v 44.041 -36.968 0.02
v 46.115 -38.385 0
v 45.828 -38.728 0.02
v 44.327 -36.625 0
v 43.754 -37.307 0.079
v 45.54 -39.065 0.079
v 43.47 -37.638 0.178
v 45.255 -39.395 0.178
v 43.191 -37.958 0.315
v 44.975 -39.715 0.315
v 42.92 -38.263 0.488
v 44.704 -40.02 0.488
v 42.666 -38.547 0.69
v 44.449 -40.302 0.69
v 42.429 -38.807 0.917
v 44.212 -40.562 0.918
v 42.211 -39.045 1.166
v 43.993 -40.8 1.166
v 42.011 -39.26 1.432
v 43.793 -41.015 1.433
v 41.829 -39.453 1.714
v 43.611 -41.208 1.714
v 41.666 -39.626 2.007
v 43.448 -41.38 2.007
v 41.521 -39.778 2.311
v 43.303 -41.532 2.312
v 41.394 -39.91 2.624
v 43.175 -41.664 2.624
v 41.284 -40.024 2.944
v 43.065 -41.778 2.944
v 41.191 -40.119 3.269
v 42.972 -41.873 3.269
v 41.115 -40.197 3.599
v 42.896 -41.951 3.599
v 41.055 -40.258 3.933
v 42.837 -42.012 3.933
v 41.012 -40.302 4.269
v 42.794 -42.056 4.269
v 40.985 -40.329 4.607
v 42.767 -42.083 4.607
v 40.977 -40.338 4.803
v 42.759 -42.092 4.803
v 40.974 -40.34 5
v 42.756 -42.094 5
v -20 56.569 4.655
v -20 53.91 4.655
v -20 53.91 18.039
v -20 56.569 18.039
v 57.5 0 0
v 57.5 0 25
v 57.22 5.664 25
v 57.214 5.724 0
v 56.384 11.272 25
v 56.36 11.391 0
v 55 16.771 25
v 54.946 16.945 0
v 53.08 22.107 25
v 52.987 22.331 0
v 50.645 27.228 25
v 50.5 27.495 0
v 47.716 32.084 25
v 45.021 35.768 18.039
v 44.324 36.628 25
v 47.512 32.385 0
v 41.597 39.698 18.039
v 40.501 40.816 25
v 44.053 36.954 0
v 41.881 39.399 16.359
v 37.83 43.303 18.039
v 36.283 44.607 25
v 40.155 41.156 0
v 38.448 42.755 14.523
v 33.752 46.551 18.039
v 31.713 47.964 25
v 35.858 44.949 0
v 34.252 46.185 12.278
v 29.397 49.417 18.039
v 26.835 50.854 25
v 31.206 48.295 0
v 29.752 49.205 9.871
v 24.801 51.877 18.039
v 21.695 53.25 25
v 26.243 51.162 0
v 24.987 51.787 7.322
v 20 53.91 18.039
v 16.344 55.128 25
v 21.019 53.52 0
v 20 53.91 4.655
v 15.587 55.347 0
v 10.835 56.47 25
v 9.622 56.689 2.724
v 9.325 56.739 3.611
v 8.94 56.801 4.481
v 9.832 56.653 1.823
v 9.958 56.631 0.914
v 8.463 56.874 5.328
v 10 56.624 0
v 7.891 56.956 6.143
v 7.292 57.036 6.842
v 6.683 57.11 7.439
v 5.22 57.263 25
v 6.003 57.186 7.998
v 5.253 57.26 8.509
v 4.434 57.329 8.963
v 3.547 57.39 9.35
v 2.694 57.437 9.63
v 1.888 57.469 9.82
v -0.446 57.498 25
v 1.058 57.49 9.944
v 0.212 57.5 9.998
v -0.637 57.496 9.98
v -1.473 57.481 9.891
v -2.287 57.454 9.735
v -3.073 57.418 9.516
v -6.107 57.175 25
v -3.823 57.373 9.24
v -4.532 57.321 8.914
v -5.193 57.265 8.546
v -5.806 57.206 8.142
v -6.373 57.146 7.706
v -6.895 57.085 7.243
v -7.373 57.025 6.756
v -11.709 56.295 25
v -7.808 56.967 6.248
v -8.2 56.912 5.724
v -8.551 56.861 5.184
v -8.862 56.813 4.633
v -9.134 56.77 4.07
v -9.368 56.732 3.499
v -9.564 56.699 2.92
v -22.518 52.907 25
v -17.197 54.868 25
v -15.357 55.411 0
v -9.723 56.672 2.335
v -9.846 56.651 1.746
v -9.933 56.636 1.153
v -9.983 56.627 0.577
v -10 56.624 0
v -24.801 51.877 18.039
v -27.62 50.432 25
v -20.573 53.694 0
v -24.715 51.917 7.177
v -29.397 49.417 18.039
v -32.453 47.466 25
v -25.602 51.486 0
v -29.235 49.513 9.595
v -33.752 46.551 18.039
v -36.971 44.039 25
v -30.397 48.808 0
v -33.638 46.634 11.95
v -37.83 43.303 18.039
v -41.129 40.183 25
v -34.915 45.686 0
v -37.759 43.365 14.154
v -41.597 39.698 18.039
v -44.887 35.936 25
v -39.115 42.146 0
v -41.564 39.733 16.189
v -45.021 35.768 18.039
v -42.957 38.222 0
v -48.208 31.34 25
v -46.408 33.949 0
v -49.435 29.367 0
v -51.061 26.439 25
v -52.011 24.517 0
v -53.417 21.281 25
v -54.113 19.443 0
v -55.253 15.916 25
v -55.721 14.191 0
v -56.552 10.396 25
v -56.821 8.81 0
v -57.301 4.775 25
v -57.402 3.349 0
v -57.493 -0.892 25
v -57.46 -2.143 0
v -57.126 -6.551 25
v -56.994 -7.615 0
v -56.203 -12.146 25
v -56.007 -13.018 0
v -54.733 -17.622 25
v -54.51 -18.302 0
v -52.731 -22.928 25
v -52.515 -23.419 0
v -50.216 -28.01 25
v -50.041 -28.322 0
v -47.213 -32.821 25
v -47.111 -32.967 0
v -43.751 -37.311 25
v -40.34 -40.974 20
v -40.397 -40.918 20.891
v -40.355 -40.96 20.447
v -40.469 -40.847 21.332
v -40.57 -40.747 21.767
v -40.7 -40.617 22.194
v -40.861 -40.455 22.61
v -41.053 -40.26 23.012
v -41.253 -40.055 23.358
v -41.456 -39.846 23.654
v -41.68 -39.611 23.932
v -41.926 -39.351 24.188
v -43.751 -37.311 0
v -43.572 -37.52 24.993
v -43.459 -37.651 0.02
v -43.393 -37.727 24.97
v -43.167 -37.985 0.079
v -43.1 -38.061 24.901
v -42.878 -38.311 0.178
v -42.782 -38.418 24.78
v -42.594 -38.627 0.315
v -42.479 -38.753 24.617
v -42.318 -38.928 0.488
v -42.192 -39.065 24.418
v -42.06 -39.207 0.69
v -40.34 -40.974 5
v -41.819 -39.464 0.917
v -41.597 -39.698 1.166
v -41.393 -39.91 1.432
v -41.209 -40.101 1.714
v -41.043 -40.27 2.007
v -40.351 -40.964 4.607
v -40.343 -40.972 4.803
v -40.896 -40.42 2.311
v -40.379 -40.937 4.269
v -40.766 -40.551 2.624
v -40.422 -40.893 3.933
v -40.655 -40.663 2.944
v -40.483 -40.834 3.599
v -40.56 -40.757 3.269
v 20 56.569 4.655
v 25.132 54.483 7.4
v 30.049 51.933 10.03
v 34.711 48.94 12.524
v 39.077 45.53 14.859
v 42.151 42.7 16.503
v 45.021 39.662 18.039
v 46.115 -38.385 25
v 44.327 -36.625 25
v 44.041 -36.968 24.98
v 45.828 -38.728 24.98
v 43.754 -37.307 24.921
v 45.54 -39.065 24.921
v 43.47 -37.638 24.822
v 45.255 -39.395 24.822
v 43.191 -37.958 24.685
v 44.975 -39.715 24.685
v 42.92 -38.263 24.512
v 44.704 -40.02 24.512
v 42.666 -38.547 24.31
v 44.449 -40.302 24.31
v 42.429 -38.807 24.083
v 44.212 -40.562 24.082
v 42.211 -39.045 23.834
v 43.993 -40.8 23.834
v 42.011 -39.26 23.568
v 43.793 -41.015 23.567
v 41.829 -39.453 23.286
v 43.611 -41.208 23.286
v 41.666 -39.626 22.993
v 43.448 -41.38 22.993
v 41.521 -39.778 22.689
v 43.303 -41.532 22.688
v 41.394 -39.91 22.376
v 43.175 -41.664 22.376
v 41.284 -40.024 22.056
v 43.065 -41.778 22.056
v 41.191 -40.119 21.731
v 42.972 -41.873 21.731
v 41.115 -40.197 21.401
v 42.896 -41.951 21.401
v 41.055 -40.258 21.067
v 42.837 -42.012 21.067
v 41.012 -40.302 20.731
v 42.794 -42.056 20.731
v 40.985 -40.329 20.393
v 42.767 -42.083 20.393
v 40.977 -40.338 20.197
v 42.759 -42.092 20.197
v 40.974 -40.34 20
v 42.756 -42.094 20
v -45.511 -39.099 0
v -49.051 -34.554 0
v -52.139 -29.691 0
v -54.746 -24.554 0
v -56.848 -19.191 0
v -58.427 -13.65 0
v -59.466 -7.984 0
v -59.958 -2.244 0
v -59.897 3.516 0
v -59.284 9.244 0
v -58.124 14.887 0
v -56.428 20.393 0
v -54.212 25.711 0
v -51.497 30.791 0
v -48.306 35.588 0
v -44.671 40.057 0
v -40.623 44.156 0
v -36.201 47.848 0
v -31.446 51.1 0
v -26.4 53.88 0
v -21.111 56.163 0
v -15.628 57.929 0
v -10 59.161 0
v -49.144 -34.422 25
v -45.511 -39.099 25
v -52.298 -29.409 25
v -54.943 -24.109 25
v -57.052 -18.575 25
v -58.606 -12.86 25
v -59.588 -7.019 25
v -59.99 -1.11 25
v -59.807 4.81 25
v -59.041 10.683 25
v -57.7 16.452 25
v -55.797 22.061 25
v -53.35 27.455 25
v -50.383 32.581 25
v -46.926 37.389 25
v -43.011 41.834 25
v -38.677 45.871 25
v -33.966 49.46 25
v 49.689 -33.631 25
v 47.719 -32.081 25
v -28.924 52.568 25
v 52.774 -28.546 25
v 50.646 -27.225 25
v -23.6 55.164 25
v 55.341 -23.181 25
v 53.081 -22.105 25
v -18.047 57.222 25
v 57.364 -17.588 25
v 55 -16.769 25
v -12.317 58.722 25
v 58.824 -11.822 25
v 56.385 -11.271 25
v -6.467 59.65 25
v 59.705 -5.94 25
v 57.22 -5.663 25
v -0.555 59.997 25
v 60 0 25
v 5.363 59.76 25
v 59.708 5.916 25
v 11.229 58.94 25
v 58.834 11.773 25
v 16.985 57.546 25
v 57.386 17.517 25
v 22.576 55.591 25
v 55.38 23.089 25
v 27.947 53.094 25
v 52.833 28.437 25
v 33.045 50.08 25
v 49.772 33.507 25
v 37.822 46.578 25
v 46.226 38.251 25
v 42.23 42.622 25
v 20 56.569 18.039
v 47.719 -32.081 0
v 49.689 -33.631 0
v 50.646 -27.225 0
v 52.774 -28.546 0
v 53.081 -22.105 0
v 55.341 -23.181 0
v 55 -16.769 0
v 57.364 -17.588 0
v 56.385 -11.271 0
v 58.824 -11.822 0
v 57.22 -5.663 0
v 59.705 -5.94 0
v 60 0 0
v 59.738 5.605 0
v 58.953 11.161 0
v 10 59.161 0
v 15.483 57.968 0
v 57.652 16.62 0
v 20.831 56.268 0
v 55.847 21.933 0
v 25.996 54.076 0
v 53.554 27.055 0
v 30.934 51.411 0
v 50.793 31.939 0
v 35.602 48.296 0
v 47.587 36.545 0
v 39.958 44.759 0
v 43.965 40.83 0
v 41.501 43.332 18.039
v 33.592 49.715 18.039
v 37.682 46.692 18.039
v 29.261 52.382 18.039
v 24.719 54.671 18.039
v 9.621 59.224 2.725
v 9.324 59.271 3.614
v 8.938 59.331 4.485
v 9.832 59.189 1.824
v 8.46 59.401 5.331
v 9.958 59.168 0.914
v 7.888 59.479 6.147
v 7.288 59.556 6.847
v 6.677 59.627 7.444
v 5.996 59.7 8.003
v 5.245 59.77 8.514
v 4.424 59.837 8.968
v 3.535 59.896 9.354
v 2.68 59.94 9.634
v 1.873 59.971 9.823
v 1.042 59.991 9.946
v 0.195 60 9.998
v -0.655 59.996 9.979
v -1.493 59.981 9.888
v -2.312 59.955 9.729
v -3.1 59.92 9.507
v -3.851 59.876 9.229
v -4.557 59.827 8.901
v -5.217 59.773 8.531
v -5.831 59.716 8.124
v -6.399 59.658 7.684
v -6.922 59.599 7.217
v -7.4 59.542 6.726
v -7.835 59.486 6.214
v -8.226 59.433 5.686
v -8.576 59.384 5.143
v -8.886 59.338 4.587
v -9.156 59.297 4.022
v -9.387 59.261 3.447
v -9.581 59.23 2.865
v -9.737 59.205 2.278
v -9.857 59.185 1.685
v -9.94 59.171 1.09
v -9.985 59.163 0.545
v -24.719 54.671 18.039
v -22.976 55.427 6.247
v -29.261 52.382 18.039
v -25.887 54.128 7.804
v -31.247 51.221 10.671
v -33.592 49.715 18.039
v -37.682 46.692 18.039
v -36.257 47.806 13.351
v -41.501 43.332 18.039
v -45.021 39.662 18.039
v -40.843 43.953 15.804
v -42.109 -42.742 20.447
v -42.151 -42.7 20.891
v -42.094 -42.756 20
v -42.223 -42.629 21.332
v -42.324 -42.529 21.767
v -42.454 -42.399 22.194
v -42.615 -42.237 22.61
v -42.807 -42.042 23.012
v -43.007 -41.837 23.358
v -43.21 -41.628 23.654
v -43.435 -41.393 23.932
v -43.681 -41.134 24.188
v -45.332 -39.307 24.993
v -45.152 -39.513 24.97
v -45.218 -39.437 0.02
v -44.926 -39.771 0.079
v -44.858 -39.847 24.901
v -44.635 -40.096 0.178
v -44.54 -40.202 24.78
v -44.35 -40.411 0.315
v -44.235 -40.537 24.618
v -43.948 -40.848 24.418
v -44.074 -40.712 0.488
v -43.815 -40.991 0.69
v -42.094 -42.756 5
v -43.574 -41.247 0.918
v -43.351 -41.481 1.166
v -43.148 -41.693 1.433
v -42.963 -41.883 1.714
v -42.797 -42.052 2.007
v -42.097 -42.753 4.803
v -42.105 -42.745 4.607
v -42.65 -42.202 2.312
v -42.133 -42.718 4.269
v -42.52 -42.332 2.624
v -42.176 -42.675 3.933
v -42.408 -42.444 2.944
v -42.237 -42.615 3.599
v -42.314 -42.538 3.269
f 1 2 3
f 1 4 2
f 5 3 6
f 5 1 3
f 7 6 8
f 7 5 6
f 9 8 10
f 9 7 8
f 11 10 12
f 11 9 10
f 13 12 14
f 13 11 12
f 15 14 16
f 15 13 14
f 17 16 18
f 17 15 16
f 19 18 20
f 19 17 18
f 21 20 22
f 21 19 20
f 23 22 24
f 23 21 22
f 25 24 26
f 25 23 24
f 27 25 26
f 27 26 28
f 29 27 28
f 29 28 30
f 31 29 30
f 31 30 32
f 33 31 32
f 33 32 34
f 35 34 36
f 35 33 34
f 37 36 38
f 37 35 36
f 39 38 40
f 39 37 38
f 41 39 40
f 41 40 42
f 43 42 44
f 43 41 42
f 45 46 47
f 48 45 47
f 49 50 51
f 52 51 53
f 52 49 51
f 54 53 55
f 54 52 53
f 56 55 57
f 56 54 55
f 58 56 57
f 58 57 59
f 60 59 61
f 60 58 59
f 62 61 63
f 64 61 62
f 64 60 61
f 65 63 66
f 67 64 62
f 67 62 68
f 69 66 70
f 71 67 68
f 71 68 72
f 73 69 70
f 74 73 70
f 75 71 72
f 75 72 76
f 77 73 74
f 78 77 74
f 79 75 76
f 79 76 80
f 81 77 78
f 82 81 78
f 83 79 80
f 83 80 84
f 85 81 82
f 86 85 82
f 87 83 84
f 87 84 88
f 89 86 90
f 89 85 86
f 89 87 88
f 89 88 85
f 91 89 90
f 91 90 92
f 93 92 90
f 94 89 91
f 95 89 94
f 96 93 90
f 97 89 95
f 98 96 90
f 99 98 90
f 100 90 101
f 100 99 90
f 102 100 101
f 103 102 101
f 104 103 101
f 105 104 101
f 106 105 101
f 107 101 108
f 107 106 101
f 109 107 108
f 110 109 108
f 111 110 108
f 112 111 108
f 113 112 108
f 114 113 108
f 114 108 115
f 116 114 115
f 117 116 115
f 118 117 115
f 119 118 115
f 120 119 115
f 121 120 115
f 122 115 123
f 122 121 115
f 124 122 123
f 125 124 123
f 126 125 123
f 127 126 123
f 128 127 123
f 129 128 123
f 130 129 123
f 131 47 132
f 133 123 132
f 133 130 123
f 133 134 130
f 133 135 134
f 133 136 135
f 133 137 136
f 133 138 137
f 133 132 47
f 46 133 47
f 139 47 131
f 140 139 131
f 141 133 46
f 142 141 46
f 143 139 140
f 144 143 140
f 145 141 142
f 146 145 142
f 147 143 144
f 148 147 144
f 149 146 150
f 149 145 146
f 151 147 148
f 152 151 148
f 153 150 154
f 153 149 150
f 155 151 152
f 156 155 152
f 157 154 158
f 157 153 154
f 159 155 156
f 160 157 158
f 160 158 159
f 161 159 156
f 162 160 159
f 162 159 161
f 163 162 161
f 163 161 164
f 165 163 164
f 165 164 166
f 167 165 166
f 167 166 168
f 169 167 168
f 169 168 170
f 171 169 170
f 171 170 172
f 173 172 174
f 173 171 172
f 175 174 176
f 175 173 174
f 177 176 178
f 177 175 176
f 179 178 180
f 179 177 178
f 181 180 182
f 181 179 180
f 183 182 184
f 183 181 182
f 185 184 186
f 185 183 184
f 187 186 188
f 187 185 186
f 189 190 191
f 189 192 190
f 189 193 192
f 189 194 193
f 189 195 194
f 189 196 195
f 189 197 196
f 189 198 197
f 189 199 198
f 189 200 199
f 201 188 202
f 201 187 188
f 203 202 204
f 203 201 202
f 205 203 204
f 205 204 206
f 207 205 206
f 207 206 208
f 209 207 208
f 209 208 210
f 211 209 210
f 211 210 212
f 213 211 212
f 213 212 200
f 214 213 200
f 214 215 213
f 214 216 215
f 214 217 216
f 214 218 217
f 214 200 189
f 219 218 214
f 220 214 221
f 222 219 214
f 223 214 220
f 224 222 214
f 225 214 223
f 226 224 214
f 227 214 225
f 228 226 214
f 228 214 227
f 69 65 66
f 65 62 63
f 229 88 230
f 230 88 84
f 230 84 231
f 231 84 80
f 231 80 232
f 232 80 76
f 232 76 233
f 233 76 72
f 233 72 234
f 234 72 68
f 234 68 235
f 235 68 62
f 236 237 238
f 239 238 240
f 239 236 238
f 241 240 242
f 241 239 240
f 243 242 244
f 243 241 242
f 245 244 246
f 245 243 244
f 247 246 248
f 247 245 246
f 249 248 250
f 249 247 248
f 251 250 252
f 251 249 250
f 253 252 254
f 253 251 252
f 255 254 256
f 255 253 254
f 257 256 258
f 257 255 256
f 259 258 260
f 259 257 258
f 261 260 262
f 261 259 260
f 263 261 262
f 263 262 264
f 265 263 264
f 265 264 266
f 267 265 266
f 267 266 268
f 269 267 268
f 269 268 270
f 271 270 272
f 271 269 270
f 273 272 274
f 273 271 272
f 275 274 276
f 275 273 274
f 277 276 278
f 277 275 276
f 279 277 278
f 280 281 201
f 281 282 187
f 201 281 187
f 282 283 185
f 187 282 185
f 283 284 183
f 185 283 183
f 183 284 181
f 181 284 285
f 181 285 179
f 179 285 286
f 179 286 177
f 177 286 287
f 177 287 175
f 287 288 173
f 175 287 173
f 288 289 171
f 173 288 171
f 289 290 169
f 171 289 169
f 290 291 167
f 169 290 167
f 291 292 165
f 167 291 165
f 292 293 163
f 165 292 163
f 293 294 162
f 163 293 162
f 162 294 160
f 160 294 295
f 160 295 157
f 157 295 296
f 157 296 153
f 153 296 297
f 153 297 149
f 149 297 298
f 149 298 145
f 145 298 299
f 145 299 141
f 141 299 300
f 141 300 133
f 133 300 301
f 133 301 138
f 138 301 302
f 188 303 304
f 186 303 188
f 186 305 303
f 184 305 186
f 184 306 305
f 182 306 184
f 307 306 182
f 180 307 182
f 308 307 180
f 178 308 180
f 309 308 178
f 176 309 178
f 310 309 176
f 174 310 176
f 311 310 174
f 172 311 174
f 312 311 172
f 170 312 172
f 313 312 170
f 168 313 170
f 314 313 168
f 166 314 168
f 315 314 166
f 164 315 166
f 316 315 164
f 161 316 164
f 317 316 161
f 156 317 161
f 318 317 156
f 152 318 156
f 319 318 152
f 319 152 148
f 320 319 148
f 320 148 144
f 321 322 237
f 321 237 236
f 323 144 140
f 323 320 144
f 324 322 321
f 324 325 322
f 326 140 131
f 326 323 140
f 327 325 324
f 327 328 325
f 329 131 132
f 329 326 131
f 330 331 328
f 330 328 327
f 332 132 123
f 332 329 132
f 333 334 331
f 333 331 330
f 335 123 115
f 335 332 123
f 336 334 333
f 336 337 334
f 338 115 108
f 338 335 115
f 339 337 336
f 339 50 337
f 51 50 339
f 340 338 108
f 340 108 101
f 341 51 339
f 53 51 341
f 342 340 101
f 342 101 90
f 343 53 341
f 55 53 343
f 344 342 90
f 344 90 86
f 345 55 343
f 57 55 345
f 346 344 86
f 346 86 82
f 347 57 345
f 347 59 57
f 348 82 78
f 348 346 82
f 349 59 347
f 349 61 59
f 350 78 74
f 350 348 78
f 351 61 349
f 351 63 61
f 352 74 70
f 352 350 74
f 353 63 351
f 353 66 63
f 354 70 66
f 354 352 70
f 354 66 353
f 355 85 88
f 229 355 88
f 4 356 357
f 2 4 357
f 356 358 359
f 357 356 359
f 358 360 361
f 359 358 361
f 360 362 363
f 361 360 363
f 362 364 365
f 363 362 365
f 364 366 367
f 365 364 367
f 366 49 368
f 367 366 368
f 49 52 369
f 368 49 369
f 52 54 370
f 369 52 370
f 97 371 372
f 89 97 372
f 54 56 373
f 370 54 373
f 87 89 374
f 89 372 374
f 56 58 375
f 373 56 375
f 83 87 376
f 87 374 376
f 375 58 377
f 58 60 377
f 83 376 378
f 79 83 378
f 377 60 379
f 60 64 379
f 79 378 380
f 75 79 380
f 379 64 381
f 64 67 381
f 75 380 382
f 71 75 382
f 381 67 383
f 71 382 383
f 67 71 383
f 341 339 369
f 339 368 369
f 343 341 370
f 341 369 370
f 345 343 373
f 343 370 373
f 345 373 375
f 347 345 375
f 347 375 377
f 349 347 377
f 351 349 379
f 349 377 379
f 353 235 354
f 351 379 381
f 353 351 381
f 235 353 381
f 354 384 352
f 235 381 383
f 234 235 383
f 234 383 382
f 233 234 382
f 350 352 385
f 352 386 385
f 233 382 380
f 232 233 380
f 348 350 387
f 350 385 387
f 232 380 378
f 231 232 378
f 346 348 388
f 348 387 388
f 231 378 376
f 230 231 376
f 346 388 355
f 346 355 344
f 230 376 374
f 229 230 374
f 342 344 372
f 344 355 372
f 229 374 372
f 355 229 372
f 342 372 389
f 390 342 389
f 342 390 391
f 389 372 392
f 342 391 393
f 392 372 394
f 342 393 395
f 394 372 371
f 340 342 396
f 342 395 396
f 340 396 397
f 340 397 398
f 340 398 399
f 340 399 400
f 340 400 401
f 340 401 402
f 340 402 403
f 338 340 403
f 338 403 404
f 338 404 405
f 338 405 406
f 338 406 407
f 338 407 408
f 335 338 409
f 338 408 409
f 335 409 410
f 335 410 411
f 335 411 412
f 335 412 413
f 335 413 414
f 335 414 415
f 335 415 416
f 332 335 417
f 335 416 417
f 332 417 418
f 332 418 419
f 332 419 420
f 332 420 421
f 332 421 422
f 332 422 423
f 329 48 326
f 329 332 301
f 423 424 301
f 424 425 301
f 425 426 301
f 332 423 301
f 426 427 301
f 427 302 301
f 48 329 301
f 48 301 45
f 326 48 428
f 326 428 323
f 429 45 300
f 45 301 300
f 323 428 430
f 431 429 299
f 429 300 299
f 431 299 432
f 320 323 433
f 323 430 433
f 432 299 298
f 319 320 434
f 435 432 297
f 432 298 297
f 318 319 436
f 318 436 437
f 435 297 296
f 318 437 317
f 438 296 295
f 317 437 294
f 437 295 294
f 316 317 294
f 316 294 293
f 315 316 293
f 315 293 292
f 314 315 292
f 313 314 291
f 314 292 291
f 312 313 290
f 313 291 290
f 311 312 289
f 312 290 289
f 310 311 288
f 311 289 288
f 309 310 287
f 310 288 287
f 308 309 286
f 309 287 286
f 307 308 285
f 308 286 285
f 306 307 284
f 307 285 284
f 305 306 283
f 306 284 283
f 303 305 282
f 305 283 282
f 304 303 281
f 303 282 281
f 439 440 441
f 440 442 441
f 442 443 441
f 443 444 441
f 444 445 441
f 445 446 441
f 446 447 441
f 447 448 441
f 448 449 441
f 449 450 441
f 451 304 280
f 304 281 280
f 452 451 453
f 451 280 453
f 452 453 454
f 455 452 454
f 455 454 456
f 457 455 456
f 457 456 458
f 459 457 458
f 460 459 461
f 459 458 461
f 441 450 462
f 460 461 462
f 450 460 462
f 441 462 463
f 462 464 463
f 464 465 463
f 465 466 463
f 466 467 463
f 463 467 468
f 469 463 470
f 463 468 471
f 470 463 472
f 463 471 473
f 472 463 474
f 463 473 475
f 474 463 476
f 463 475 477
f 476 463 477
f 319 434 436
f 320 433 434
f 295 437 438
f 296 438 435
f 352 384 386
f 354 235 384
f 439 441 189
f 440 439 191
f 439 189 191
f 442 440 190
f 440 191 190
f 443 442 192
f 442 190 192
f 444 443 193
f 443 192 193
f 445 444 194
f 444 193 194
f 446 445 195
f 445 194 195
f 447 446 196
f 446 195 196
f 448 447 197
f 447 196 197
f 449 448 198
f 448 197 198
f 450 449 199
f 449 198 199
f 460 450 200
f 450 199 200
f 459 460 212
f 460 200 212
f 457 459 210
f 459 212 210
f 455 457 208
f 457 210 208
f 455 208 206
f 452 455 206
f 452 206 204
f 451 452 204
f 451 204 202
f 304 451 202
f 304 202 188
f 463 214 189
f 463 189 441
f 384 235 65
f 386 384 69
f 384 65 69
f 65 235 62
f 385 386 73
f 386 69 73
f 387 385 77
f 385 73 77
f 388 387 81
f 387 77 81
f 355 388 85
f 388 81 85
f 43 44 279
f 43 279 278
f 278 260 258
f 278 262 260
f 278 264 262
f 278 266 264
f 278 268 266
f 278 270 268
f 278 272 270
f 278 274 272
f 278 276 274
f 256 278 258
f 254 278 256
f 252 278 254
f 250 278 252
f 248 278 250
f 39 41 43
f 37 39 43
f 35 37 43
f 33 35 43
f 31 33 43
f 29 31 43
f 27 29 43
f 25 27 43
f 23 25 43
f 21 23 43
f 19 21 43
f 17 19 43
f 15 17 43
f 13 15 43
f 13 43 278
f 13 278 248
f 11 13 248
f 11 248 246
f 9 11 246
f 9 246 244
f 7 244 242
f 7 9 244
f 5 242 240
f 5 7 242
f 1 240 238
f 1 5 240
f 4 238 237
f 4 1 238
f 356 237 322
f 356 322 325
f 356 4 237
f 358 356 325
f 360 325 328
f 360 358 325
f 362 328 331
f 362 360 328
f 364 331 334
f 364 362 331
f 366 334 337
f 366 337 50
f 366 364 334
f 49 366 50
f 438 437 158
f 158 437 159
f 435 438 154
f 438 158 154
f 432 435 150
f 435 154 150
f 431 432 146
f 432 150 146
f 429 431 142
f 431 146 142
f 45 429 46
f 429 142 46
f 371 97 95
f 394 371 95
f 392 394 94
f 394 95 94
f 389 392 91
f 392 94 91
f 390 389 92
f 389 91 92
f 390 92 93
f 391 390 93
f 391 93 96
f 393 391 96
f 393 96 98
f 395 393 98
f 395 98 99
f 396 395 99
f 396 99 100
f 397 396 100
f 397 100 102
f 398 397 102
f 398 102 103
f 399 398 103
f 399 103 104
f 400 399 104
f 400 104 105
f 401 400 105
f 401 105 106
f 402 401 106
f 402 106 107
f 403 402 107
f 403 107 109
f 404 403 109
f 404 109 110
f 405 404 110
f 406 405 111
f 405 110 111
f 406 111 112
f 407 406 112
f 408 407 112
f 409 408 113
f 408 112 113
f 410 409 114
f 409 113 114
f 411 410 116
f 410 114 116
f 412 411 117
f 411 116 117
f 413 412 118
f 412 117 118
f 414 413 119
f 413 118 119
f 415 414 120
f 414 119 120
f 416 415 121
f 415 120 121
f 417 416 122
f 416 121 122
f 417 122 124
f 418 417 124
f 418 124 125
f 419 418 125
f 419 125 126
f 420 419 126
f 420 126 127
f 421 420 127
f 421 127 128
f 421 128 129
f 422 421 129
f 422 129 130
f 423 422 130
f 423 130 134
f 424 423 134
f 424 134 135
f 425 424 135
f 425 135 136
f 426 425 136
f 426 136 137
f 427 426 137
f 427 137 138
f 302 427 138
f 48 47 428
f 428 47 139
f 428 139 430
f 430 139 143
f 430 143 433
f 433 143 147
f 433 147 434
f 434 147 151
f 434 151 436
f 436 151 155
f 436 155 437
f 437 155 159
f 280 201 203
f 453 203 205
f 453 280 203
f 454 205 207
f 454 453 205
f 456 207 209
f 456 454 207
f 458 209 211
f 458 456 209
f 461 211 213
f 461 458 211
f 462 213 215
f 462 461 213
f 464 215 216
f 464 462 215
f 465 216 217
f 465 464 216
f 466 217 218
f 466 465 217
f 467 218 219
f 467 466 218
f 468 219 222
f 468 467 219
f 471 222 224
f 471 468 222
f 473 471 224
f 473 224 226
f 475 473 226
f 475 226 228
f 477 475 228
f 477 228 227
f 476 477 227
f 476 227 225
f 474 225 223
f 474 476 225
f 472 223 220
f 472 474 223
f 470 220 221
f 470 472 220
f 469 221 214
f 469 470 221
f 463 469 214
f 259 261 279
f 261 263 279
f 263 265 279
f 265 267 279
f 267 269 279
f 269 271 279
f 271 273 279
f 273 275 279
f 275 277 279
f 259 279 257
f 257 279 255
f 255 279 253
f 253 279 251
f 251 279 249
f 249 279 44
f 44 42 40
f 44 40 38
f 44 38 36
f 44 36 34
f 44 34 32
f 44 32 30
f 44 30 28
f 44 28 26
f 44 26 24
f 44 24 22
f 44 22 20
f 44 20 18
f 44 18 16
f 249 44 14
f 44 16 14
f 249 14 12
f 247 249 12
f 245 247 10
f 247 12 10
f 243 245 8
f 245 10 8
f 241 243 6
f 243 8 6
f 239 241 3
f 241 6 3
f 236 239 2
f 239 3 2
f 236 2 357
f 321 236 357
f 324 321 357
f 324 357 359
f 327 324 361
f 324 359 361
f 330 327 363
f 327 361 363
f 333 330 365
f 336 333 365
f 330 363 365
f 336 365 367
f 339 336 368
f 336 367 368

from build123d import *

# Parameters (mm, degrees)
F0_R     = 60
F0_R_2   = 57.5
F1_DEPTH = 25
F2_R     = 10
F3_DEPTH = 60.001
F5_DEPTH = 60.0010001012
F7_DEPTH = 25.0010001
F8_R     = 5


# Not quite as in the source:
# - a feature names something its author has since deleted; it is built from what else it names


with BuildPart() as f1:
    # F0 (on Top) → F1 (new body)
    with BuildSketch(Plane.XY):
        Circle(F0_R)
        Circle(F0_R_2, mode=Mode.SUBTRACT)
    extrude(amount=F1_DEPTH)

    # F2 (on Front) → F3 (cut, through all)
    with BuildSketch(Plane.XZ):
        Circle(F2_R)
    extrude(amount=-F3_DEPTH, mode=Mode.SUBTRACT)

    # F4 (on Front) → F5 (cut, through all)
    with BuildSketch(Plane.XZ):
        Polygon((-20, 4.6551390551), (-20, 18.0386640131), (-45.0213760883, 18.0386640131), align=None)
        Polygon((45.0213760883, 18.0386640131), (20, 18.0386640131), (20, 4.6551390551), align=None)
    extrude(amount=-F5_DEPTH, mode=Mode.SUBTRACT)

    # F6 (on Top) → F7 (cut, through all)
    with BuildSketch(Plane.XY):
        Polygon((66.0135835631, -64.9920968146), (0, 0), (-63.9864164369, -64.9920968146), align=None)
    extrude(amount=F7_DEPTH, mode=Mode.SUBTRACT)

    # F8
    f8_edges = [f1.edges().sort_by_distance(p)[0] for p in [
        (-41.217352, -41.865169, 25),
        (-41.217352, -41.865169, 0),
        (41.865169, -41.217352, 25),
        (41.865169, -41.217352, 0),
    ]]
    fillet(f8_edges, radius=F8_R)


solid = f1.part
